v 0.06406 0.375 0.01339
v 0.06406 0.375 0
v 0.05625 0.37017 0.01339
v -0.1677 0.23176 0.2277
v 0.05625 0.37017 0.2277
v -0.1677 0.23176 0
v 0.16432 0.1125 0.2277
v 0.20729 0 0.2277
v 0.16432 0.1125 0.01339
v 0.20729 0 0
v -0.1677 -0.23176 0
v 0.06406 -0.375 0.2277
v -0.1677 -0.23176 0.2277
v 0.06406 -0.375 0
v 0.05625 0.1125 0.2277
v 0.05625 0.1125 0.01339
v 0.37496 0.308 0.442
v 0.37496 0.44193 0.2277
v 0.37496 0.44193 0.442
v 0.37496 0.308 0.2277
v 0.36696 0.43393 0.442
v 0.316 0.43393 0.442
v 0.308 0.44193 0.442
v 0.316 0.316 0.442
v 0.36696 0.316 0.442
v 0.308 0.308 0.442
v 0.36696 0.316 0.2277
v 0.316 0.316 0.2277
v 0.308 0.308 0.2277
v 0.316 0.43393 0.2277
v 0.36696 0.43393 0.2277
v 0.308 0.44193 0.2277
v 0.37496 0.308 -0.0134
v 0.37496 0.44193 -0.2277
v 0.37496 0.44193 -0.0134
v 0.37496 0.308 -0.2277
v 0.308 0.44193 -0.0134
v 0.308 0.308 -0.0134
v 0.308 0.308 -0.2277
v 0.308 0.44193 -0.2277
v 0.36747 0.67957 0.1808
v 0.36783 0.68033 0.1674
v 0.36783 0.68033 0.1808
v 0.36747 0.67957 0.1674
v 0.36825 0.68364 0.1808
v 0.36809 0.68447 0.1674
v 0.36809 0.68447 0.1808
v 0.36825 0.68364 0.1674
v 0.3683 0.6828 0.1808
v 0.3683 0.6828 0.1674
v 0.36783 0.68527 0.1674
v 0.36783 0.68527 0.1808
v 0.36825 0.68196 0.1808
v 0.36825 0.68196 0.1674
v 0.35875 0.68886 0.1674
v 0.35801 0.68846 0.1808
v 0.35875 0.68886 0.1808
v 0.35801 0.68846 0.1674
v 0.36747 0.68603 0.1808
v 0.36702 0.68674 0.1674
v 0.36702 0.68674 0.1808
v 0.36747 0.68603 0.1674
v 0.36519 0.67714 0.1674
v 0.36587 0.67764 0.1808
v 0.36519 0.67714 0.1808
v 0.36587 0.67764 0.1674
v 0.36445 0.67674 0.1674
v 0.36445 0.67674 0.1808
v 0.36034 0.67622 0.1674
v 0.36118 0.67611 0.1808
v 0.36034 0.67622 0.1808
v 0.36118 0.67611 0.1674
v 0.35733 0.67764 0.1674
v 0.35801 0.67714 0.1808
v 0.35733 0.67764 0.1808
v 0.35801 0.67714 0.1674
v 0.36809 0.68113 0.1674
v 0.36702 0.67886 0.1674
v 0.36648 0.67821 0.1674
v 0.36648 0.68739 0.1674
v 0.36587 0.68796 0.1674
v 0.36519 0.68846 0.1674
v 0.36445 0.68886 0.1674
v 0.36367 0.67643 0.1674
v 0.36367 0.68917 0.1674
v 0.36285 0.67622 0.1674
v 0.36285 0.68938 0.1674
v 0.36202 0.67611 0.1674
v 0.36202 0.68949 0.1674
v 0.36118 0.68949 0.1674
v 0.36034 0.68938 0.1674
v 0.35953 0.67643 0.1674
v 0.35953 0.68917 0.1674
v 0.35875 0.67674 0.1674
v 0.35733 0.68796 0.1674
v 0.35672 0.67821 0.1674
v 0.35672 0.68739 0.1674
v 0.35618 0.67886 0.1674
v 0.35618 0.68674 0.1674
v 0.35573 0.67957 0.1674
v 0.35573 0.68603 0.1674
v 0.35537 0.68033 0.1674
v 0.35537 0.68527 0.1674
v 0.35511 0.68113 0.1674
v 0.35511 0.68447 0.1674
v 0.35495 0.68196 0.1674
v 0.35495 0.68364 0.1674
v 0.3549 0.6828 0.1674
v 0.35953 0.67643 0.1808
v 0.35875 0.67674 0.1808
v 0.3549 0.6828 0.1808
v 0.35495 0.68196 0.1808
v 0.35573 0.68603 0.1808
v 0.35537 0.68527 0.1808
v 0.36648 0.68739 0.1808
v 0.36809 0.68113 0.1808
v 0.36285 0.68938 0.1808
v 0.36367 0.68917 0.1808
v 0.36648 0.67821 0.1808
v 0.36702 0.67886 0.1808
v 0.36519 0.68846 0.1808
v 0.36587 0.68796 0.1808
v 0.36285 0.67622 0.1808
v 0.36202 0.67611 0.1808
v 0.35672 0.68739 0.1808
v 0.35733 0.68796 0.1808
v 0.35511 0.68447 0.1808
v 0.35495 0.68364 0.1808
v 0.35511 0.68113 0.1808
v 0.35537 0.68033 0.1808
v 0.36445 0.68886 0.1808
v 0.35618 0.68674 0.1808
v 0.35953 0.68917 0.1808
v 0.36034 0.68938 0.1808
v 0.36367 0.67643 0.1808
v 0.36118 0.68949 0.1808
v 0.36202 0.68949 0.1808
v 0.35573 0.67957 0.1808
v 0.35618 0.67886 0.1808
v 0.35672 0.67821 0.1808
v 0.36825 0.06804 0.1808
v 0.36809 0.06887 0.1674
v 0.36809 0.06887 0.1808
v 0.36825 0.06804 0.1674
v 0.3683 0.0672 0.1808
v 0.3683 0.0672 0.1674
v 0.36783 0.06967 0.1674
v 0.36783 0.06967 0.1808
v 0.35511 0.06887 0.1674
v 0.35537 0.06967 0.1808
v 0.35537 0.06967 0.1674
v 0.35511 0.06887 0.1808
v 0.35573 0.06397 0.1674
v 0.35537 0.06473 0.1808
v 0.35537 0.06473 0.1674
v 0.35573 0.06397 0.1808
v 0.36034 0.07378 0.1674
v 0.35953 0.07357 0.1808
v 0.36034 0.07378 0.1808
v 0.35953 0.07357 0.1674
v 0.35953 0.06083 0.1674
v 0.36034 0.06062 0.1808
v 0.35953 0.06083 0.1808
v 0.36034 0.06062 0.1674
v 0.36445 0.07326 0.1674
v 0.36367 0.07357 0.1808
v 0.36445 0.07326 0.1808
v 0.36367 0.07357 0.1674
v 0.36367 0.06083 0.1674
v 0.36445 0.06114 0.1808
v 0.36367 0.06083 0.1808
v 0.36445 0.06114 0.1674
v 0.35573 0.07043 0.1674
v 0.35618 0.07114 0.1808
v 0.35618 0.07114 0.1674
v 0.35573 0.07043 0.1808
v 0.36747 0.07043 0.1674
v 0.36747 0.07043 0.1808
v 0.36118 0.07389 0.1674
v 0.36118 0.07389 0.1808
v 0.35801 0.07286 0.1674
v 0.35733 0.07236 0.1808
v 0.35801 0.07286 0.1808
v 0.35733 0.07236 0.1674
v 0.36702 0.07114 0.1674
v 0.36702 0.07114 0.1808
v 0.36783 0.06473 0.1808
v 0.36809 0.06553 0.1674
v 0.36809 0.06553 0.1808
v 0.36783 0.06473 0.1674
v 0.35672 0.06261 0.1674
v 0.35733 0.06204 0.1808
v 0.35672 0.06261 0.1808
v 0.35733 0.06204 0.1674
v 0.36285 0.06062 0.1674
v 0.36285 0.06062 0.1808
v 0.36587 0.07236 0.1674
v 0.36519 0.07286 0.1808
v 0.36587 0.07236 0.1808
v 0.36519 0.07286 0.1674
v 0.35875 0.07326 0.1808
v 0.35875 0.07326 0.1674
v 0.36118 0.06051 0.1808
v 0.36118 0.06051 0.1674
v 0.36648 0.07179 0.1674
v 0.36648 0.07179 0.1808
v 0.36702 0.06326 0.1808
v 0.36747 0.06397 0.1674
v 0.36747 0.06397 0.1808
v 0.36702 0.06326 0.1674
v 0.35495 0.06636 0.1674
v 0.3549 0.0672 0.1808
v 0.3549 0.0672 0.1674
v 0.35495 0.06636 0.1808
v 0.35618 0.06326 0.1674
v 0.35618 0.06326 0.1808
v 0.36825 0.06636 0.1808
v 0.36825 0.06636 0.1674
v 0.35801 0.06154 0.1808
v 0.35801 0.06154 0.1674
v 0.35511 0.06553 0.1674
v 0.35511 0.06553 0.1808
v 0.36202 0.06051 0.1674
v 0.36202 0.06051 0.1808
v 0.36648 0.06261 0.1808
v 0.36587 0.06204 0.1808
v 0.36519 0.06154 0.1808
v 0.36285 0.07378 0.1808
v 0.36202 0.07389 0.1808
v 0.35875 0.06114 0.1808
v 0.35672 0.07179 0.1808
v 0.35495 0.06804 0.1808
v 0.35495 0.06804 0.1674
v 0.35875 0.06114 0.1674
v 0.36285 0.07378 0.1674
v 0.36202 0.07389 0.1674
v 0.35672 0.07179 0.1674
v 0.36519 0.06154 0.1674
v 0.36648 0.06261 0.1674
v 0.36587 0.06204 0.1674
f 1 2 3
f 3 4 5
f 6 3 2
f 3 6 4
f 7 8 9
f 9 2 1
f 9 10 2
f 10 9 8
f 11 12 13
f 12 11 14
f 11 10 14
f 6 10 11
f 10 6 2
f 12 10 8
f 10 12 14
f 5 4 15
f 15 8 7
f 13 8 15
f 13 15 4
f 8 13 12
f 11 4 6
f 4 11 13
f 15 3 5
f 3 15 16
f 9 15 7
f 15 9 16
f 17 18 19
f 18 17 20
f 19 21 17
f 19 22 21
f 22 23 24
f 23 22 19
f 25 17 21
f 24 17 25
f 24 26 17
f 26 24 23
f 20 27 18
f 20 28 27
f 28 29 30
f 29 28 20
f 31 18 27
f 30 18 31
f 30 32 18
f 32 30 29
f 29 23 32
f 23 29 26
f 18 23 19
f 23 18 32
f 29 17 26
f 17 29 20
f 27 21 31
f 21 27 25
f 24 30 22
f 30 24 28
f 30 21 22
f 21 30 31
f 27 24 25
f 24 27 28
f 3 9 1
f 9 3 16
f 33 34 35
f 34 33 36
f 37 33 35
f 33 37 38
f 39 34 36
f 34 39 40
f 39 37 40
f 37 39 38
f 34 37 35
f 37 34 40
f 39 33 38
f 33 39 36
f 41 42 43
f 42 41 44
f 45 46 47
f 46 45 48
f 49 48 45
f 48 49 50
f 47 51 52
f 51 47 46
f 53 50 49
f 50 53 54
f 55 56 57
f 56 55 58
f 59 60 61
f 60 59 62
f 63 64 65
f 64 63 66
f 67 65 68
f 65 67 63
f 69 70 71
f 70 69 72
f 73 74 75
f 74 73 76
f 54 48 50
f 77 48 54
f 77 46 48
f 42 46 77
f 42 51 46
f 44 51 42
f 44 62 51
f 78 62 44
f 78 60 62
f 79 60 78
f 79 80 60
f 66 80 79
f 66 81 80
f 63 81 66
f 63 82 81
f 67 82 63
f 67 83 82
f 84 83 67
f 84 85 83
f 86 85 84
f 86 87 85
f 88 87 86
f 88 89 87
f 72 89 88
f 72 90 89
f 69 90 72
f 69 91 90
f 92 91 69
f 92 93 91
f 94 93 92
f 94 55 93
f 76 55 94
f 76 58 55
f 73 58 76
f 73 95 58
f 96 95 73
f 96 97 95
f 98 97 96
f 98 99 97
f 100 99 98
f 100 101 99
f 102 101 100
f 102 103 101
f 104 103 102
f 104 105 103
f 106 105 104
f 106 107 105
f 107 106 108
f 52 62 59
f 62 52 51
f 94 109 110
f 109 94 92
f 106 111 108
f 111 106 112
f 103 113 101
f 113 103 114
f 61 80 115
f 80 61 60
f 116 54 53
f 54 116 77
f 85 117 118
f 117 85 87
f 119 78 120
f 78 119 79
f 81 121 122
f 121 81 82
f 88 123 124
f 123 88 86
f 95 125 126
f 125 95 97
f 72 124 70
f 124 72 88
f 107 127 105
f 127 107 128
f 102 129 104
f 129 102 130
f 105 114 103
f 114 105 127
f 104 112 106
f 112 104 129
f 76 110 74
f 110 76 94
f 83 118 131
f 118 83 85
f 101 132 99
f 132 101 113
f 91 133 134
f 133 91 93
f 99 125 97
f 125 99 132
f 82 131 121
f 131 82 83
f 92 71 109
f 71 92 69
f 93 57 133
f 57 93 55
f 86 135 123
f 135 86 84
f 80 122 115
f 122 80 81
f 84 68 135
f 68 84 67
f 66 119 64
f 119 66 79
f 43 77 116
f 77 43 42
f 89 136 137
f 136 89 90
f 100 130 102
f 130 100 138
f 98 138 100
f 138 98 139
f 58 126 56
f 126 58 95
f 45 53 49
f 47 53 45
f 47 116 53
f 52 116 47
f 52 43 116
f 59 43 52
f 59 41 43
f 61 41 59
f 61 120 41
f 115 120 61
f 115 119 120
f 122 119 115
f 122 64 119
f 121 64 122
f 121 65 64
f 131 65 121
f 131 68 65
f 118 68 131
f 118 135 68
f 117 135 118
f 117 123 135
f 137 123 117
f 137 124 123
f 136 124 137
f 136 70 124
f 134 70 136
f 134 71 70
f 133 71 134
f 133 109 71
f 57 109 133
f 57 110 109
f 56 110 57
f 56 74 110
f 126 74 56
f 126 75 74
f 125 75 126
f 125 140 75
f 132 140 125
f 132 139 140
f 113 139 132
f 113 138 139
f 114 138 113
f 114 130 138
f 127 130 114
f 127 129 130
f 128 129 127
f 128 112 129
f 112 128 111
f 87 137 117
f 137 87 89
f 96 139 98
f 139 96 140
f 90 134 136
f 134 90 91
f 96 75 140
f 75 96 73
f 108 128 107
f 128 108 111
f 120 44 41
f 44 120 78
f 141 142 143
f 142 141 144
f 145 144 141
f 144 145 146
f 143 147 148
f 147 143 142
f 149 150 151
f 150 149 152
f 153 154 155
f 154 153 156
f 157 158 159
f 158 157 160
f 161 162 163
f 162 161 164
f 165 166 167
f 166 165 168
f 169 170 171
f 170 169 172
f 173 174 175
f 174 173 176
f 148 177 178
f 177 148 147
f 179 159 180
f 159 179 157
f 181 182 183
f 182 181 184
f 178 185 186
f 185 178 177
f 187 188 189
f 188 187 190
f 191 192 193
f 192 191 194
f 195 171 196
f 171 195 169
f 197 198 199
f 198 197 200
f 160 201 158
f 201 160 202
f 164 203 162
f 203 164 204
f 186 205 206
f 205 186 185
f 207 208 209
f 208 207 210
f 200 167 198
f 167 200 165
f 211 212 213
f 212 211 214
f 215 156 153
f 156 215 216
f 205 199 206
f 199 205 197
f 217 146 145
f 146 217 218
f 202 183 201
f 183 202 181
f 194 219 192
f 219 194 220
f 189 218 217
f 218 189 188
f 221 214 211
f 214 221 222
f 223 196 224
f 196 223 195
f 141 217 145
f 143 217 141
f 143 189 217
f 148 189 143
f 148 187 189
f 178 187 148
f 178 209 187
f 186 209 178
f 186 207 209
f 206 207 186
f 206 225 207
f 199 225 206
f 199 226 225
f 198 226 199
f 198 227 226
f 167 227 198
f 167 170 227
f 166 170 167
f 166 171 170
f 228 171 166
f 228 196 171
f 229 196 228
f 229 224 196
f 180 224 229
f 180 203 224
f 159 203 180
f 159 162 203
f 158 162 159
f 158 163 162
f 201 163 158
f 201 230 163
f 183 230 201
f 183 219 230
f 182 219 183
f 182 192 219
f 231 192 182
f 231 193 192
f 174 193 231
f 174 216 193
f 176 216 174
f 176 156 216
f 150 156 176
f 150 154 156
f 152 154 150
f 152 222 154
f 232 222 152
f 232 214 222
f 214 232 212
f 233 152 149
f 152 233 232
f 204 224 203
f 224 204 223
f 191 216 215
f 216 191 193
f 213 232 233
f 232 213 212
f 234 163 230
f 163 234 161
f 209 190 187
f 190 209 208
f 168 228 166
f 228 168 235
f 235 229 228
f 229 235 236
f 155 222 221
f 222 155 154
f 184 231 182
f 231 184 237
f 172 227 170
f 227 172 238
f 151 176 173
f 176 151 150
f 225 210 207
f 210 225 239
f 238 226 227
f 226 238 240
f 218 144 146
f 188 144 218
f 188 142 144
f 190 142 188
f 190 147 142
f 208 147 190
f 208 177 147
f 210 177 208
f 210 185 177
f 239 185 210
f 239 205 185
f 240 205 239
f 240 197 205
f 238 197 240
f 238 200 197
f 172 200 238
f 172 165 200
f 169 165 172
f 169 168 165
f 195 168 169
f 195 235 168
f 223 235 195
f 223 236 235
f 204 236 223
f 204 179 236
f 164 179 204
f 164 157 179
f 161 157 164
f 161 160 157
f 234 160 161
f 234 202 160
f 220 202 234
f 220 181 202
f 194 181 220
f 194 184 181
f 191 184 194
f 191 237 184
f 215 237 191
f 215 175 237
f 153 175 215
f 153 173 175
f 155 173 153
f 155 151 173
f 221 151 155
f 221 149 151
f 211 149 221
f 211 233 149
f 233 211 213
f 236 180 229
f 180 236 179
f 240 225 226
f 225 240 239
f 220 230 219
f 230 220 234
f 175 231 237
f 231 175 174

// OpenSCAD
// Parametric Model: Complex Base with Sleeve and Openings
// All dimensions in inches

// --- Parameters ---
base_length = 0.375;
base_width = 0.75;
base_thickness = 0.013393;
second_solid_reach = 0.2277; // from base datum

// Sleeve/Post parameters
sleeve_length = 0.066964;
sleeve_width = 0.133929;
sleeve_height = 0.214286;
sleeve_extrusion = 0.2143;
sleeve_total_reach = 0.442; // from base datum
sleeve_offset_left = 0.308;
sleeve_offset_right = 0;
sleeve_offset_front = 0.308;
sleeve_offset_back = 0.3081;

// Lower continuation parameters
lower_depth = 0.2143;
lower_start_below_base = 0.2277; // below base underside
lower_end_below_base = 0.0134;   // below base underside

// Circular opening parameters
hole_radius = 0.0067;
hole_axis_left = 0.3616;
hole1_axis_front = 0.6828;
hole2_axis_front = 0.0672;
hole_band_start = 0.1674; // above base underside
hole_band_end = 0.1808;   // above base underside
hole_cut_depth = 0.0134;

// Derived parameters
lower_z_start = -lower_start_below_base; // negative = below base datum
lower_z_end = -lower_end_below_base;
sleeve_z_start = second_solid_reach;
sleeve_z_end = sleeve_z_start + sleeve_extrusion;
hole_band_mid = (hole_band_start + hole_band_end) / 2;

// --- Modules ---
// Create base with rounded/arc footprint (ellipse approximation)
module base_plate() {
    // Use linear extrude with scale to create tapered/arc shape
    // Scale factors create elliptical curvature in XY
    scale_x = 1.0;
    scale_y = 1.0;
    linear_extrude(height=base_thickness, scale=[scale_x, scale_y])
        resize([base_length, base_width]) circle(d=1);
}

// Create second solid with inner openings
module second_solid() {
    difference() {
        // Outer volume
        linear_extrude(height=second_solid_reach)
            resize([base_length, base_width]) circle(d=1);
        
        // Inner openings - create hollow regions
        // Using difference to create openings
        translate([0, 0, -0.001])
        linear_extrude(height=second_solid_reach + 0.002)
            // Create inner loop region (example rectangular opening)
            translate([base_length*0.15, base_width*0.15])
                square([base_length*0.7, base_width*0.7]);
    }
}

// Create raised sleeve/post with hollow interior
module raised_sleeve() {
    sleeve_x = sleeve_offset_left;
    sleeve_y = sleeve_offset_front;
    
    difference() {
        // Solid sleeve material
        translate([sleeve_x, sleeve_y, sleeve_z_start])
            cube([sleeve_length, sleeve_width, sleeve_extrusion]);
        
        // Inner void/slot - elongated opening
        // Create hollow interior with walls
        wall_thickness = 0.008;
        translate([sleeve_x + wall_thickness, 
                   sleeve_y + wall_thickness, 
                   sleeve_z_start - 0.001])
            cube([sleeve_length - 2*wall_thickness,
                  sleeve_width - 2*wall_thickness,
                  sleeve_extrusion + 0.002]);
    }
}

// Create lower continuation beneath sleeve
module lower_continuation() {
    // Shares right edge with sleeve, contained within base footprint
    lower_x = sleeve_offset_left; // Same X as sleeve
    lower_y = sleeve_offset_front; // Same Y as sleeve
    lower_length = sleeve_length;
    lower_width = sleeve_width;
    
    translate([lower_x, lower_y, lower_z_start])
        cube([lower_length, lower_width, lower_depth]);
}

// Create circular openings
module circular_openings() {
    // Two holes at specified positions
    for (y_pos = [hole1_axis_front, hole2_axis_front]) {
        translate([hole_axis_left, y_pos, hole_band_start])
            cylinder(h=hole_cut_depth, r=hole_radius, $fn=50);
    }
}

// --- Main Assembly ---
union() {
    // Base plate
    color("LightGray") base_plate();
    
    // Second solid with openings
    color("Gray") second_solid();
    
    // Raised sleeve
    color("DarkGray") raised_sleeve();
    
    // Lower continuation
    color("SlateGray") lower_continuation();
}

// Subtract circular openings from the assembly
difference() {
    children(0); // Reference the union above
    circular_openings();
}
